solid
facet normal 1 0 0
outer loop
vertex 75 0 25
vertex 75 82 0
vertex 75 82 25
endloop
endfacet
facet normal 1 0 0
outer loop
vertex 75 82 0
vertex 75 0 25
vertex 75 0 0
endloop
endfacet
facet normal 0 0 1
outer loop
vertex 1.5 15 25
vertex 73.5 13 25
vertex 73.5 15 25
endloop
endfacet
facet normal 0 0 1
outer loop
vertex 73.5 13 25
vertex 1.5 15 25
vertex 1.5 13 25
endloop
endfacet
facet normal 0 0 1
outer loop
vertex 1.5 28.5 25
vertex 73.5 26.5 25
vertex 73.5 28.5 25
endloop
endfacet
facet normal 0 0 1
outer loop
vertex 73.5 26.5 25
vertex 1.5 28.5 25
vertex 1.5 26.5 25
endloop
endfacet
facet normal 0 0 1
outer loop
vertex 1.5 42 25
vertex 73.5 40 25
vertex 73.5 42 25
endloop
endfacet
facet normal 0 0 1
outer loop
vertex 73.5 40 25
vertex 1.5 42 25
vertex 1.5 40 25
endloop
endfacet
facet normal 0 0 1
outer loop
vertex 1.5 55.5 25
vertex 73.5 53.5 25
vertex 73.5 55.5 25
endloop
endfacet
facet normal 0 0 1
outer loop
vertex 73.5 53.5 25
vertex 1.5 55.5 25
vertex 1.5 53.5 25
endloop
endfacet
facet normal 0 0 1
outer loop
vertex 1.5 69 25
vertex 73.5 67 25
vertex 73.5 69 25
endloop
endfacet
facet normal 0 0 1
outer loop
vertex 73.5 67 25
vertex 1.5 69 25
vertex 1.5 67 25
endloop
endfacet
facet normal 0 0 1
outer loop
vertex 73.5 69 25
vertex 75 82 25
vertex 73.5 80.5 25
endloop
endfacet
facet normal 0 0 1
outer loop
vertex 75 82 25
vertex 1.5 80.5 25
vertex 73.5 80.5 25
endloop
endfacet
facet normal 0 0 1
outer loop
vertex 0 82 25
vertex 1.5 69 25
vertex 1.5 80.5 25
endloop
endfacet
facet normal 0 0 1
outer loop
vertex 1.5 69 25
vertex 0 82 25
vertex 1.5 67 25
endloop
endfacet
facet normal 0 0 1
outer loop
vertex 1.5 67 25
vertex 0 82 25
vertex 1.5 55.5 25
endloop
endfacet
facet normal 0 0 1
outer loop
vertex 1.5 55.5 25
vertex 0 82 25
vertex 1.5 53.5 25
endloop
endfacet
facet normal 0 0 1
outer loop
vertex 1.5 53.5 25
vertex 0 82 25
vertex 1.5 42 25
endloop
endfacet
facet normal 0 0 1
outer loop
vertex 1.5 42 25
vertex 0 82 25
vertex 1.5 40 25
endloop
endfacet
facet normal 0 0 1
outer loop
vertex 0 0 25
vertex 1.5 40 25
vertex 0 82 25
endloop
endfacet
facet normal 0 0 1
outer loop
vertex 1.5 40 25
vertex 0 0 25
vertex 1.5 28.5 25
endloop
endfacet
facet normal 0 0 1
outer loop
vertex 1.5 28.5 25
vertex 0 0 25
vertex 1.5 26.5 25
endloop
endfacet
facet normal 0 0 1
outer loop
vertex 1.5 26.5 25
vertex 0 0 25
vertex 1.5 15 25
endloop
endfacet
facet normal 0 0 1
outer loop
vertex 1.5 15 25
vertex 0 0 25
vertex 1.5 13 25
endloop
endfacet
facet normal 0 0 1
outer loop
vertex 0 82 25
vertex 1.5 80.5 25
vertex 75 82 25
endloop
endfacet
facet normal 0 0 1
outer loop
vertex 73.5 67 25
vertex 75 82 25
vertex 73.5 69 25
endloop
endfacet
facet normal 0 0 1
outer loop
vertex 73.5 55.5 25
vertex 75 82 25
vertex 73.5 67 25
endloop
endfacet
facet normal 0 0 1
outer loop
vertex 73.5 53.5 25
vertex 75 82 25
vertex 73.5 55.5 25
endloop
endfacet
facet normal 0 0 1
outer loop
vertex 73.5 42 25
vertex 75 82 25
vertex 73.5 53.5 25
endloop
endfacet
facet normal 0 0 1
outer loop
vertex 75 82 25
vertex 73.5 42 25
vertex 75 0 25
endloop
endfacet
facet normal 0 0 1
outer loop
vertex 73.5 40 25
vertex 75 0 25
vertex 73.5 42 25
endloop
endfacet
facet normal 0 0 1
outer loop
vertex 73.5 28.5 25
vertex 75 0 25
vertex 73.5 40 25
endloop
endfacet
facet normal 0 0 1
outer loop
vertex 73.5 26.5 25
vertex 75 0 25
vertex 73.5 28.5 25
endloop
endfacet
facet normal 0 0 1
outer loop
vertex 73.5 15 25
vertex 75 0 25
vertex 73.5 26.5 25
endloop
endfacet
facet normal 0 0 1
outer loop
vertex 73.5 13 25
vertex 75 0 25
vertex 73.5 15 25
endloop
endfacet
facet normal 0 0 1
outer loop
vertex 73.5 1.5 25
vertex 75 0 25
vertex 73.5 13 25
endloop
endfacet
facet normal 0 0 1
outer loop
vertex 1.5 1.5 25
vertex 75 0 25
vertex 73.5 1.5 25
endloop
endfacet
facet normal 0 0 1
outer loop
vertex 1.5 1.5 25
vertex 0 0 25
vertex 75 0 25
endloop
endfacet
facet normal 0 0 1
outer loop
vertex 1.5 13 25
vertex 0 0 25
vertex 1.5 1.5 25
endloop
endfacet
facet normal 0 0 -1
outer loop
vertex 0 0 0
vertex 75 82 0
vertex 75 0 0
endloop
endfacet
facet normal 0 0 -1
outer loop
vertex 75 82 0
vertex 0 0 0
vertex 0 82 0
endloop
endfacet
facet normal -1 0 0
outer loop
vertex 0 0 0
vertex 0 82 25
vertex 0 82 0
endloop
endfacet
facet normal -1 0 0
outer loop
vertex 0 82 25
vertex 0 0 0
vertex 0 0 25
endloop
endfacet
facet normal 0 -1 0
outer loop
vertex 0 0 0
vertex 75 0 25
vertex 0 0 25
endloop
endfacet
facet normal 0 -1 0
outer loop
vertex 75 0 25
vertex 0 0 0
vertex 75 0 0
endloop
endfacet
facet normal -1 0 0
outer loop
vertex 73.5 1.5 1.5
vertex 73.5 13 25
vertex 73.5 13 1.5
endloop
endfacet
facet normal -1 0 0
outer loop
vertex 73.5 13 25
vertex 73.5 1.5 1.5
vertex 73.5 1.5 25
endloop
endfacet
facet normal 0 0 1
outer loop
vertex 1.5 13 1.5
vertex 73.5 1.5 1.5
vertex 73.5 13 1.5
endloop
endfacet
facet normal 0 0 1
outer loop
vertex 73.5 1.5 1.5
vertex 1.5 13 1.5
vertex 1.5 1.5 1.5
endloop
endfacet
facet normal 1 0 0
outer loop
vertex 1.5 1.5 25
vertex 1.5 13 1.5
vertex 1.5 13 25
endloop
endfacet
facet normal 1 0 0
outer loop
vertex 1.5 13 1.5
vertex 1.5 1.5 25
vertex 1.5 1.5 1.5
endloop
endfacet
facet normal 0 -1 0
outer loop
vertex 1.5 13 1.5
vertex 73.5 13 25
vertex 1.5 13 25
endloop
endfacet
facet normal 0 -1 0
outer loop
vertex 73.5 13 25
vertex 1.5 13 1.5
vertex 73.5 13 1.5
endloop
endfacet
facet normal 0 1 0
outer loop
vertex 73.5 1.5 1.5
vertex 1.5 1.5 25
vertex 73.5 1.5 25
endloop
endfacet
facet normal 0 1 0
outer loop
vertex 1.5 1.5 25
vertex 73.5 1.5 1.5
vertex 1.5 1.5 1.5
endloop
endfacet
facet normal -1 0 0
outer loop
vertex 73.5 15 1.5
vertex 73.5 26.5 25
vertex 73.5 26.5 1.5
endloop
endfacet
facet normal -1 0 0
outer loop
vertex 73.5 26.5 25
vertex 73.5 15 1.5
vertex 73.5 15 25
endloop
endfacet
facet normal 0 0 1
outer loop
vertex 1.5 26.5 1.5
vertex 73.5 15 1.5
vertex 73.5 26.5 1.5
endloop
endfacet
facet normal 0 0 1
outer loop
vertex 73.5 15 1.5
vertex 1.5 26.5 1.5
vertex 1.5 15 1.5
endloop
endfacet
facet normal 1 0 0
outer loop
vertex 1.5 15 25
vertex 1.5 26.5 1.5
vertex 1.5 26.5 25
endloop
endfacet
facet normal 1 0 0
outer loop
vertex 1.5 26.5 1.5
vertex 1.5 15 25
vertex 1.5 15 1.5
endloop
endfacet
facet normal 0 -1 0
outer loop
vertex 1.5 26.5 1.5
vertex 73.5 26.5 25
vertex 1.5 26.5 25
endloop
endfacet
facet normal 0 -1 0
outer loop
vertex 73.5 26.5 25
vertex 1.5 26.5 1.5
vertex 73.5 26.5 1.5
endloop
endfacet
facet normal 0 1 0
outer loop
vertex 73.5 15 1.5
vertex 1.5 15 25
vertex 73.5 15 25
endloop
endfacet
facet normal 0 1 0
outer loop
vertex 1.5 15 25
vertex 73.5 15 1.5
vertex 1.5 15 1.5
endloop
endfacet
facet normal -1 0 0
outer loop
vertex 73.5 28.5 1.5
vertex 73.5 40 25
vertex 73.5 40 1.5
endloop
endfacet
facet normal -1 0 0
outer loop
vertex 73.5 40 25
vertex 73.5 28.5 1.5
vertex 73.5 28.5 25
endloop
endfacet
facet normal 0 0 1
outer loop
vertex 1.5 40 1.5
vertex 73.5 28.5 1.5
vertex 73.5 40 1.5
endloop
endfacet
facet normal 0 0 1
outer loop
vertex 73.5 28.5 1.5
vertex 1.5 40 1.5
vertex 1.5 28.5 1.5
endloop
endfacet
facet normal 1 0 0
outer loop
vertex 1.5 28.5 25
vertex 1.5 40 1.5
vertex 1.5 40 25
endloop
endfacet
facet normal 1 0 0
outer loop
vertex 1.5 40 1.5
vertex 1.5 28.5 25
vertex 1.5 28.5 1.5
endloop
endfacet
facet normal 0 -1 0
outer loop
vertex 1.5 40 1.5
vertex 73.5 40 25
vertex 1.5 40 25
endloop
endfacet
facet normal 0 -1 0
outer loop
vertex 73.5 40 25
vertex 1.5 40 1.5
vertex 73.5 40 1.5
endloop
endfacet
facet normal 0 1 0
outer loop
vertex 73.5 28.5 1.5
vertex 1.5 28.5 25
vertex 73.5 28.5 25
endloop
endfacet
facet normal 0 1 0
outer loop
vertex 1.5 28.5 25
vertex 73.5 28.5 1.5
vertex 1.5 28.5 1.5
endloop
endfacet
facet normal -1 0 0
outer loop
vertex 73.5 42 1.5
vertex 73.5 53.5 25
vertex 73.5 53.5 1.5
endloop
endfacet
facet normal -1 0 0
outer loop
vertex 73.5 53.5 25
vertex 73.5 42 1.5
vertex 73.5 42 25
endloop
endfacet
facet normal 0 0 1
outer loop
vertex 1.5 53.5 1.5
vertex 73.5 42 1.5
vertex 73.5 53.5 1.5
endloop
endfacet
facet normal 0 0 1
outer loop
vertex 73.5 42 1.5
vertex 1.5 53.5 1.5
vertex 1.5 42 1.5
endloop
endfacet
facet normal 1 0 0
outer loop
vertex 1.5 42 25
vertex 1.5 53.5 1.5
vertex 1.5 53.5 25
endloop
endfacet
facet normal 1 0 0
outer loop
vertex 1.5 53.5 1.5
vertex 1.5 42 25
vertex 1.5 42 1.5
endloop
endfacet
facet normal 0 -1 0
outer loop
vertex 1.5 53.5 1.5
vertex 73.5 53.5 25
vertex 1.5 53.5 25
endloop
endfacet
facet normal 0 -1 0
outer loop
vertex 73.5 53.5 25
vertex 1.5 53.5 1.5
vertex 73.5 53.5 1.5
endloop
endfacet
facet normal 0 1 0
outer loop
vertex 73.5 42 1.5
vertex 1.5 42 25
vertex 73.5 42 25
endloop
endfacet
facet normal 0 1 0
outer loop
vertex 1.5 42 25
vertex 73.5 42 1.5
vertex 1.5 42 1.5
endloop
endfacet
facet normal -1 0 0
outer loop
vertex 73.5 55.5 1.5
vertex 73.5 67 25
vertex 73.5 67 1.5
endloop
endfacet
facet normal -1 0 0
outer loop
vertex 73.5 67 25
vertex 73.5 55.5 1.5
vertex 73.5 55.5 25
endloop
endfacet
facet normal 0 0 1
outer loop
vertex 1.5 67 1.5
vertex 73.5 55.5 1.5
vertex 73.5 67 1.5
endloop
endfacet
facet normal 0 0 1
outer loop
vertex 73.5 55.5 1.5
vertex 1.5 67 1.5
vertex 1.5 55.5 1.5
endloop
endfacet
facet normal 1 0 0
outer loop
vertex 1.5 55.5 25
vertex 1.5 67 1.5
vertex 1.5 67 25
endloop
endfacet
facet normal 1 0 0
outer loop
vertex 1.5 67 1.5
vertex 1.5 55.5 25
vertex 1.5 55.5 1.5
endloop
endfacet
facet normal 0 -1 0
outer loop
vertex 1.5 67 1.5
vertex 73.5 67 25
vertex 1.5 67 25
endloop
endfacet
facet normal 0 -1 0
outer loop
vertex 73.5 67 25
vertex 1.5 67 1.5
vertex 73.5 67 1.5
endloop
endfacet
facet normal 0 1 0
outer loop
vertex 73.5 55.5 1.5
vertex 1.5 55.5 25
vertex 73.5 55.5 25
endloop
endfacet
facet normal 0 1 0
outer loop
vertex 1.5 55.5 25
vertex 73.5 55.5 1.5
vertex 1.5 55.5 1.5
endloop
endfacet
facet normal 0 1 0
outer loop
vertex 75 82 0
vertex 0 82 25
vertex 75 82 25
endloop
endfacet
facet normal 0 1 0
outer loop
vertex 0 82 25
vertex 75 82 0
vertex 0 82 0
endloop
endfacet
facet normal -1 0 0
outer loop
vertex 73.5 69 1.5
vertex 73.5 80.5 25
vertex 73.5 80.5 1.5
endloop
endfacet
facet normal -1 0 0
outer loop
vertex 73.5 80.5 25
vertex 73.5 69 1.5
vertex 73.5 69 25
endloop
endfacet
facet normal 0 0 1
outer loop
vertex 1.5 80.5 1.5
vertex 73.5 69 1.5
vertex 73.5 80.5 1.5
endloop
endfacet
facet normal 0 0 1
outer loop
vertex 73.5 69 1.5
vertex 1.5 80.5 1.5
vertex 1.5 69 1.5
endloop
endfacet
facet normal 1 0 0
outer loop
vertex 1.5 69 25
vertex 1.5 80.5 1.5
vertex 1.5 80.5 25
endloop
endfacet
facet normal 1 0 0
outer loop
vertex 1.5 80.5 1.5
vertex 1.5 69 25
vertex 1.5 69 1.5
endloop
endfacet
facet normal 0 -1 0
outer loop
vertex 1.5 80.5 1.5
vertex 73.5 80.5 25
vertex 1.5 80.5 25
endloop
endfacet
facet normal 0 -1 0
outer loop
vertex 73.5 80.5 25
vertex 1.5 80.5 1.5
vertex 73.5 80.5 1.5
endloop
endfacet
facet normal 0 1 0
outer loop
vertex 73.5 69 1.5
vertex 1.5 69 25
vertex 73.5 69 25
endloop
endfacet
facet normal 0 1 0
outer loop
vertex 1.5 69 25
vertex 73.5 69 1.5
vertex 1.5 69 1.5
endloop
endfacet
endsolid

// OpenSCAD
/*
 * harddiskholder.scad
 *
 * Written by Roy Sigurd Karlsbakk <roy@karlsbakk.net>
 * Licensed under AGPL v3. See https://www.gnu.org/licenses/agpl-3.0.html
 * for details
 * 
 * disktype choices
 *
 *   HDD-3.5        Alias av HDD-3.5-34
 *   HDD-3.5-20     Thinner drives, not much used these days (2022)
 *   HDD-3.5-24     Usual 3,5" size
 *   HDD-2.5        Alias for HDD-2.5-7
 *   HDD-2.5-5      Really thin ones
 *   HDD-2.5-7      Probably the most common
 *   HDD-2.5-9.5    Older drives/SSDs
 *   HDD-2.5-12.5   Older or larger
 *   HDD-2.5-15     This and the next one are usually only used for large SAS drives
 *   HDD-2.5-19
 *
 * Set disktype according to what you want.
 * Set wall_thickness accordingly. My testing shows that 1.5mm should be fine with
 * 2.5" drives, while you might want 2mm for 3.5" drives.abs
 * Call storboks() with the number of drives you need space for. It will only grow
 * in the Y axis.
 */

wall_thickness = 1.5;

disktype = "HDD-2.5-9.5";

boksdim = disktype == "HDD-3.5" ? [105,26,40] : 
          disktype == "HDD-3.5-20" ? [105,22,40] : 
          disktype == "HDD-3.5-23" ? [105,26,40] : 
          disktype == "HDD-2.5-5" ? [72,7,25] : 
          disktype == "HDD-2.5" ? [72,9,25] : 
          disktype == "HDD-2.5-7" ? [72,9,25] : 
          disktype == "HDD-2.5-9.5" ? [72,11.5,25] : 
          disktype == "HDD-2.5-12.5" ? [72,14.5,25] : 
          disktype == "HDD-2.5-15" ? [72,17,25] : 
          disktype == "HDD-2.5-19" ? [72,21,25] : 
          [];

// internal vars
ty=wall_thickness;

module boks() {
    difference() {
        cube([boksdim[0]+ty*2,boksdim[1]+ty*2,boksdim[2]]);
        
        translate([ty,ty,ty]) {
            cube(boksdim);
        }
    }
}

module storboks(antall) {
    for (t = [0:antall-1]) {
        translate([0, boksdim[1]*t+t*2, 0]) {
            boks();
        }
    }
}

storboks(6);
